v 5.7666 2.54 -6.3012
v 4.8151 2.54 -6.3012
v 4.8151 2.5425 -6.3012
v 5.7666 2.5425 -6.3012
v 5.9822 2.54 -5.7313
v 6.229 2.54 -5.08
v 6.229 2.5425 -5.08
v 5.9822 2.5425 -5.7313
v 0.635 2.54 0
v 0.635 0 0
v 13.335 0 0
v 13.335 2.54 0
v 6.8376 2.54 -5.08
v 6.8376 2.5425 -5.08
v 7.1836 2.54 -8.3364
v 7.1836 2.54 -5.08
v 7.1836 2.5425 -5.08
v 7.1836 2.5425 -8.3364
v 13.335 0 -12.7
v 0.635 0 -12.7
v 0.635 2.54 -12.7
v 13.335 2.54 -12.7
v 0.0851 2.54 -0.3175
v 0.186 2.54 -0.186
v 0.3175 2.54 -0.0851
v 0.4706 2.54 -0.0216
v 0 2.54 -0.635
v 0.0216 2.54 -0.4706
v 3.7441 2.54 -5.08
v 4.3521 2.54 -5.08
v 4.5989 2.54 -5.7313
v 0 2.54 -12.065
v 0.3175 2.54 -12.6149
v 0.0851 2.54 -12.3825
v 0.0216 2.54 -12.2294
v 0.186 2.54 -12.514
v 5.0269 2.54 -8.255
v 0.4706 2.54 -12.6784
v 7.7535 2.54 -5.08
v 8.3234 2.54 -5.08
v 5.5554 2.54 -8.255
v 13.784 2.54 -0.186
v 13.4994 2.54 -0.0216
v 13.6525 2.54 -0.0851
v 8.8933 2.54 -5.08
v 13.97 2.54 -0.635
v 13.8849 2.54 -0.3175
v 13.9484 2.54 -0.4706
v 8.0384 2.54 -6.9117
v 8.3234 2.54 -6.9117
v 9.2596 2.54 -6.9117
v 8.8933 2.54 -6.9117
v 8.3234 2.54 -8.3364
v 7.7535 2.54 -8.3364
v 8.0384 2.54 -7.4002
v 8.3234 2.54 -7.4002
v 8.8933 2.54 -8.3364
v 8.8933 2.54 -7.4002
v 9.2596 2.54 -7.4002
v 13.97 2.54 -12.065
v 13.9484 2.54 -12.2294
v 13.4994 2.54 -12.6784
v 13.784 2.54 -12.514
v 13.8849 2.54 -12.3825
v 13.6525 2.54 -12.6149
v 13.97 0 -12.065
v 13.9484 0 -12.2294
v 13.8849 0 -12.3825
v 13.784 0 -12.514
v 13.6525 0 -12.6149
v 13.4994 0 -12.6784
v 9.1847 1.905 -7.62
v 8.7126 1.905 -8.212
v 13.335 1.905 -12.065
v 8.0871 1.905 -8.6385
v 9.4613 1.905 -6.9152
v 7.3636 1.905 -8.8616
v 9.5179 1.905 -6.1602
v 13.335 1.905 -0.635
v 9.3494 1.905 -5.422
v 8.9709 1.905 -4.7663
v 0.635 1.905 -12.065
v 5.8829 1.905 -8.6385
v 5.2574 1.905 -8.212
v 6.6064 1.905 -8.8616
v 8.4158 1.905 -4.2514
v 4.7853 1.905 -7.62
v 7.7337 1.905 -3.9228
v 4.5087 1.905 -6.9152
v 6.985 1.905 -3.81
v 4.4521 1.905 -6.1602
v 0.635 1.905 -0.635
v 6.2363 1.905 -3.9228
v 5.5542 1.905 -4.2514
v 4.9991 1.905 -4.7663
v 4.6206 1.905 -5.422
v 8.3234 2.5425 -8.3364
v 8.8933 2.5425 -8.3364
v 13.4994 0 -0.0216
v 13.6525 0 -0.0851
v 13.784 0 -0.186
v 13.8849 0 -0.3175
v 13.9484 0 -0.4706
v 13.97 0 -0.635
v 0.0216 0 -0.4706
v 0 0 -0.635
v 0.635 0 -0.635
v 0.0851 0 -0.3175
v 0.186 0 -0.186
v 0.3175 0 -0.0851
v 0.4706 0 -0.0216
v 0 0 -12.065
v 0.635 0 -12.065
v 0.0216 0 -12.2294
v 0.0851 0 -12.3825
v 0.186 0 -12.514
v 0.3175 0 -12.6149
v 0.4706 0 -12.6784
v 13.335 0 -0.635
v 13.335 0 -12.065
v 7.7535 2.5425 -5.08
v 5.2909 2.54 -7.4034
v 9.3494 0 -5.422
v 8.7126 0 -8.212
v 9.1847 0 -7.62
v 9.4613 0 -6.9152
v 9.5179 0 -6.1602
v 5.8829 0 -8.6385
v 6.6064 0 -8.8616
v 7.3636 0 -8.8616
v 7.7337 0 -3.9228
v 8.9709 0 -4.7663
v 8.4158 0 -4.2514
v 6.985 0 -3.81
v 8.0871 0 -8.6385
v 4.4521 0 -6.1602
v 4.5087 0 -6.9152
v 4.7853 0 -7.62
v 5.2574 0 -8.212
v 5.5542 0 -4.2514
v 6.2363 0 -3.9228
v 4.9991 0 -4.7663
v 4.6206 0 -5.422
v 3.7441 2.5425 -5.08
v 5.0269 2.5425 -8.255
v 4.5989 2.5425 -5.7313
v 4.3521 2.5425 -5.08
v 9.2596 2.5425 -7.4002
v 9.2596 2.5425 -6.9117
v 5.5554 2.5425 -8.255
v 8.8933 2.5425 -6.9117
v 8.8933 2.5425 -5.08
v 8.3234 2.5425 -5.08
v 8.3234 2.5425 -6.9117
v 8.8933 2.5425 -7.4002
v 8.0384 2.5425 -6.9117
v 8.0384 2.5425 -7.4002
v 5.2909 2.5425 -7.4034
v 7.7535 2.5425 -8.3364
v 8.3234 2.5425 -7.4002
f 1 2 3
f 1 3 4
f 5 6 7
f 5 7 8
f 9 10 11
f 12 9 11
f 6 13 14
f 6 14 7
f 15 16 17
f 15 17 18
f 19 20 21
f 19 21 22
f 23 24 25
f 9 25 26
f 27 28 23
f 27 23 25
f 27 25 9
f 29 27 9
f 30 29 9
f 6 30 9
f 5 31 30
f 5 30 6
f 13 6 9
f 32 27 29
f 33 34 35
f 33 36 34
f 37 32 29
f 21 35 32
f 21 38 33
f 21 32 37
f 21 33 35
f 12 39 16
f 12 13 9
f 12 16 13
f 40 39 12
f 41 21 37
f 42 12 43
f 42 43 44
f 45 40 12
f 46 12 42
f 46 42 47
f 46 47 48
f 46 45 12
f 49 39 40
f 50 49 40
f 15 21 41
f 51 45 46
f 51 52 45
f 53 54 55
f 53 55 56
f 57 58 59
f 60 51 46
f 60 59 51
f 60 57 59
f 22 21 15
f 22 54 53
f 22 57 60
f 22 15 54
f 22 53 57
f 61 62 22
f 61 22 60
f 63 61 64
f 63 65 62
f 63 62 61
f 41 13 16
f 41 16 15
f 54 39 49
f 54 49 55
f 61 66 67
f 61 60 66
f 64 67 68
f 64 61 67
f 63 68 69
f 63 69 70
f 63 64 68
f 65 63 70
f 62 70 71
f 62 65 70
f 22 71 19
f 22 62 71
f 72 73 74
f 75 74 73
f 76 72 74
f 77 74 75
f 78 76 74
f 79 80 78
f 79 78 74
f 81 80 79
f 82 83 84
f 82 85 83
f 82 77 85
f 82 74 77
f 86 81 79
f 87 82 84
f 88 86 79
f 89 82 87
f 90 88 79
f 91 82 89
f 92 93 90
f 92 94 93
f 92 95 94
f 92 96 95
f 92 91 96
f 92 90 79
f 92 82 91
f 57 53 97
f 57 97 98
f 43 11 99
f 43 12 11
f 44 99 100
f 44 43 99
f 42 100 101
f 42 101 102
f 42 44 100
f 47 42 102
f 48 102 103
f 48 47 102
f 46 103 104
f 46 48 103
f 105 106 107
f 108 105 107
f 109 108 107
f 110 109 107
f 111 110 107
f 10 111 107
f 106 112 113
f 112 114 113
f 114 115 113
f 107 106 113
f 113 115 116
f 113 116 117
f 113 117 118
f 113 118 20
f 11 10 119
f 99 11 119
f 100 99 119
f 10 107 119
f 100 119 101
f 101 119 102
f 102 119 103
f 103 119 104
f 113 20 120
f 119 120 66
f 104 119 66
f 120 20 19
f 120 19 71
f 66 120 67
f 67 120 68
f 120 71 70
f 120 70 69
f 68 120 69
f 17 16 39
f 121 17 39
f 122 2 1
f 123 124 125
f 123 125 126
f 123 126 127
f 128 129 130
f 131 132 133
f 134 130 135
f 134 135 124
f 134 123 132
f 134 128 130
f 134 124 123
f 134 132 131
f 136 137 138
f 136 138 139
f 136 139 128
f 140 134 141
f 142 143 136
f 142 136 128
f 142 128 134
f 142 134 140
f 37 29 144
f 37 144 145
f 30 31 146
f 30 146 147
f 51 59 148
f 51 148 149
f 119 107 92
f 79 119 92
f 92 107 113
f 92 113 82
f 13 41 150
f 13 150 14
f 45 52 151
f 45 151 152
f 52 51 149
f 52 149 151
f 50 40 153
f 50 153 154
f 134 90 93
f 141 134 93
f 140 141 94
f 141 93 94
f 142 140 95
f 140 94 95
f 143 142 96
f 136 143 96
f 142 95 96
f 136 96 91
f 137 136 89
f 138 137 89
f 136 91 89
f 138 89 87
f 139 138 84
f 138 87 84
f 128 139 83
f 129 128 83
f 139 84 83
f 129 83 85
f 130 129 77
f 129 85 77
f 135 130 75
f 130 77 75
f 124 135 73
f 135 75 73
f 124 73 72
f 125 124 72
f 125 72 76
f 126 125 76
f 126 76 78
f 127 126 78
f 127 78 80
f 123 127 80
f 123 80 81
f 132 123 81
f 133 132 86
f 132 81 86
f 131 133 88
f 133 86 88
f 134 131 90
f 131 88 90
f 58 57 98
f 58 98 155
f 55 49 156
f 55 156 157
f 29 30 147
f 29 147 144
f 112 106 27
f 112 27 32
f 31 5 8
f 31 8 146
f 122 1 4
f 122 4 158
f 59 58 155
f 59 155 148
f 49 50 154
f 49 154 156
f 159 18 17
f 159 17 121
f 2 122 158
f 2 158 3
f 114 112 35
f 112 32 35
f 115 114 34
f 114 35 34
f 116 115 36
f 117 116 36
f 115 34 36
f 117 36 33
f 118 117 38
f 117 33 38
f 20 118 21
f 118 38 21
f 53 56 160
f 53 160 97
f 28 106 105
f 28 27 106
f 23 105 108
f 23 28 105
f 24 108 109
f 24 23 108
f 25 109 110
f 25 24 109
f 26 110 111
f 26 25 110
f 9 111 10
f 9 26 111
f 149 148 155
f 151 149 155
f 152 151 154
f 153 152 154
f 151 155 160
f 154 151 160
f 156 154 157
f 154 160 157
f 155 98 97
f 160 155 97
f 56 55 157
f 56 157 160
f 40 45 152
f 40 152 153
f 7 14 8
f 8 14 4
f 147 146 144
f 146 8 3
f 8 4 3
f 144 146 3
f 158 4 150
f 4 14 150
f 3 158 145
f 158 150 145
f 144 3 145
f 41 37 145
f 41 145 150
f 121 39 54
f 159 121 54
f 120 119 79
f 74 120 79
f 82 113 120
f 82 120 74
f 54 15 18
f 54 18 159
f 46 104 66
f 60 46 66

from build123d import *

# Parameters (mm, degrees)
SKETCH1_W           = 13.97
SKETCH1_H           = 12.7
BOSS_EXTRUDE1_DEPTH = 2.54
FILLET1_R           = 0.635
SHELL1_START        = 0.635
SHELL1_OUTLINE_W    = 1.905
SHELL1_OUTLINE_H    = 11.43
SHELL1_DEPTH        = 12.7
SKETCH2_R           = 2.54
BOSS_EXTRUDE2_DEPTH = 1.905
SKETCH3_W           = 0.569871795
SKETCH3_H           = 3.256410256
BOSS_EXTRUDE3_DEPTH = 0.00254


# Read off the part's stored shape, not the designer's step: Shell1
with BuildPart() as part:
    # Sketch1 → Boss-Extrude1 (new body)
    with BuildSketch(Plane(origin=(0, 0, 0), x_dir=(1, 0, 0), z_dir=(0, 1, 0))):
        with Locations((6.985, 6.35)):
            Rectangle(SKETCH1_W, SKETCH1_H)
    extrude(amount=BOSS_EXTRUDE1_DEPTH)

    # Fillet1
    fillet1_edges = [part.edges().sort_by_distance(p)[0] for p in [
        (0, 1.27, -12.7),
        (13.97, 1.27, -12.7),
        (13.97, 1.27, 0),
        (0, 1.27, 0),
    ]]
    fillet(fillet1_edges, radius=FILLET1_R)

    # Shell1 outline → Shell1 (cut)
    with BuildSketch(Plane.YZ.offset(SHELL1_START)):
        with Locations((0.9525, -6.35)):
            Rectangle(SHELL1_OUTLINE_W, SHELL1_OUTLINE_H)
    extrude(amount=SHELL1_DEPTH, mode=Mode.SUBTRACT)

    # Sketch2 → Boss-Extrude2 (add)
    with BuildSketch(Plane(origin=(0, 1.905, 0), x_dir=(-1, 0, 0), z_dir=(0, -1, 0))):
        with Locations(Location((-6.985, 6.35, 0), (0, 0, 270))):
            Circle(SKETCH2_R)
    extrude(amount=BOSS_EXTRUDE2_DEPTH)

    # Sketch3 → Boss-Extrude3 (add)
    # profile 1 of 3: a face of its own
    with BuildSketch(Plane(origin=(0, 2.54, 0), x_dir=(1, 0, 0), z_dir=(0, 1, 0))):
        Polygon((5.026905248, 8.255), (5.555435897, 8.255), (6.837647436, 5.08), (6.228978566, 5.08), (5.982203726, 5.731282051), (4.598865385, 5.731282051), (4.352090545, 5.08), (3.744057692, 5.08), align=None)
        Polygon((5.290852564, 7.403372396), (4.815111378, 6.301153846), (5.76659375, 6.301153846), align=None, mode=Mode.SUBTRACT)
    # profile 2 of 3: a face of its own
    with BuildSketch(Plane(origin=(0, 2.54, 0), x_dir=(1, 0, 0), z_dir=(0, 1, 0))):
        with Locations((7.468576924, 6.708205128)):
            Rectangle(SKETCH3_W, SKETCH3_H)
    # profile 3 of 3: a face of its own
    with BuildSketch(Plane(origin=(0, 2.54, 0), x_dir=(1, 0, 0), z_dir=(0, 1, 0))):
        Polygon((8.323384615, 8.336410256), (8.89325641, 8.336410256), (8.89325641, 7.400192308), (9.259602564, 7.400192308), (9.259602564, 6.911730769), (8.89325641, 6.911730769), (8.89325641, 5.08), (8.323384615, 5.08), (8.323384615, 6.911730769), (8.038448718, 6.911730769), (8.038448718, 7.400192308), (8.323384615, 7.400192308), align=None)
    extrude(amount=BOSS_EXTRUDE3_DEPTH)


solid = part.part
